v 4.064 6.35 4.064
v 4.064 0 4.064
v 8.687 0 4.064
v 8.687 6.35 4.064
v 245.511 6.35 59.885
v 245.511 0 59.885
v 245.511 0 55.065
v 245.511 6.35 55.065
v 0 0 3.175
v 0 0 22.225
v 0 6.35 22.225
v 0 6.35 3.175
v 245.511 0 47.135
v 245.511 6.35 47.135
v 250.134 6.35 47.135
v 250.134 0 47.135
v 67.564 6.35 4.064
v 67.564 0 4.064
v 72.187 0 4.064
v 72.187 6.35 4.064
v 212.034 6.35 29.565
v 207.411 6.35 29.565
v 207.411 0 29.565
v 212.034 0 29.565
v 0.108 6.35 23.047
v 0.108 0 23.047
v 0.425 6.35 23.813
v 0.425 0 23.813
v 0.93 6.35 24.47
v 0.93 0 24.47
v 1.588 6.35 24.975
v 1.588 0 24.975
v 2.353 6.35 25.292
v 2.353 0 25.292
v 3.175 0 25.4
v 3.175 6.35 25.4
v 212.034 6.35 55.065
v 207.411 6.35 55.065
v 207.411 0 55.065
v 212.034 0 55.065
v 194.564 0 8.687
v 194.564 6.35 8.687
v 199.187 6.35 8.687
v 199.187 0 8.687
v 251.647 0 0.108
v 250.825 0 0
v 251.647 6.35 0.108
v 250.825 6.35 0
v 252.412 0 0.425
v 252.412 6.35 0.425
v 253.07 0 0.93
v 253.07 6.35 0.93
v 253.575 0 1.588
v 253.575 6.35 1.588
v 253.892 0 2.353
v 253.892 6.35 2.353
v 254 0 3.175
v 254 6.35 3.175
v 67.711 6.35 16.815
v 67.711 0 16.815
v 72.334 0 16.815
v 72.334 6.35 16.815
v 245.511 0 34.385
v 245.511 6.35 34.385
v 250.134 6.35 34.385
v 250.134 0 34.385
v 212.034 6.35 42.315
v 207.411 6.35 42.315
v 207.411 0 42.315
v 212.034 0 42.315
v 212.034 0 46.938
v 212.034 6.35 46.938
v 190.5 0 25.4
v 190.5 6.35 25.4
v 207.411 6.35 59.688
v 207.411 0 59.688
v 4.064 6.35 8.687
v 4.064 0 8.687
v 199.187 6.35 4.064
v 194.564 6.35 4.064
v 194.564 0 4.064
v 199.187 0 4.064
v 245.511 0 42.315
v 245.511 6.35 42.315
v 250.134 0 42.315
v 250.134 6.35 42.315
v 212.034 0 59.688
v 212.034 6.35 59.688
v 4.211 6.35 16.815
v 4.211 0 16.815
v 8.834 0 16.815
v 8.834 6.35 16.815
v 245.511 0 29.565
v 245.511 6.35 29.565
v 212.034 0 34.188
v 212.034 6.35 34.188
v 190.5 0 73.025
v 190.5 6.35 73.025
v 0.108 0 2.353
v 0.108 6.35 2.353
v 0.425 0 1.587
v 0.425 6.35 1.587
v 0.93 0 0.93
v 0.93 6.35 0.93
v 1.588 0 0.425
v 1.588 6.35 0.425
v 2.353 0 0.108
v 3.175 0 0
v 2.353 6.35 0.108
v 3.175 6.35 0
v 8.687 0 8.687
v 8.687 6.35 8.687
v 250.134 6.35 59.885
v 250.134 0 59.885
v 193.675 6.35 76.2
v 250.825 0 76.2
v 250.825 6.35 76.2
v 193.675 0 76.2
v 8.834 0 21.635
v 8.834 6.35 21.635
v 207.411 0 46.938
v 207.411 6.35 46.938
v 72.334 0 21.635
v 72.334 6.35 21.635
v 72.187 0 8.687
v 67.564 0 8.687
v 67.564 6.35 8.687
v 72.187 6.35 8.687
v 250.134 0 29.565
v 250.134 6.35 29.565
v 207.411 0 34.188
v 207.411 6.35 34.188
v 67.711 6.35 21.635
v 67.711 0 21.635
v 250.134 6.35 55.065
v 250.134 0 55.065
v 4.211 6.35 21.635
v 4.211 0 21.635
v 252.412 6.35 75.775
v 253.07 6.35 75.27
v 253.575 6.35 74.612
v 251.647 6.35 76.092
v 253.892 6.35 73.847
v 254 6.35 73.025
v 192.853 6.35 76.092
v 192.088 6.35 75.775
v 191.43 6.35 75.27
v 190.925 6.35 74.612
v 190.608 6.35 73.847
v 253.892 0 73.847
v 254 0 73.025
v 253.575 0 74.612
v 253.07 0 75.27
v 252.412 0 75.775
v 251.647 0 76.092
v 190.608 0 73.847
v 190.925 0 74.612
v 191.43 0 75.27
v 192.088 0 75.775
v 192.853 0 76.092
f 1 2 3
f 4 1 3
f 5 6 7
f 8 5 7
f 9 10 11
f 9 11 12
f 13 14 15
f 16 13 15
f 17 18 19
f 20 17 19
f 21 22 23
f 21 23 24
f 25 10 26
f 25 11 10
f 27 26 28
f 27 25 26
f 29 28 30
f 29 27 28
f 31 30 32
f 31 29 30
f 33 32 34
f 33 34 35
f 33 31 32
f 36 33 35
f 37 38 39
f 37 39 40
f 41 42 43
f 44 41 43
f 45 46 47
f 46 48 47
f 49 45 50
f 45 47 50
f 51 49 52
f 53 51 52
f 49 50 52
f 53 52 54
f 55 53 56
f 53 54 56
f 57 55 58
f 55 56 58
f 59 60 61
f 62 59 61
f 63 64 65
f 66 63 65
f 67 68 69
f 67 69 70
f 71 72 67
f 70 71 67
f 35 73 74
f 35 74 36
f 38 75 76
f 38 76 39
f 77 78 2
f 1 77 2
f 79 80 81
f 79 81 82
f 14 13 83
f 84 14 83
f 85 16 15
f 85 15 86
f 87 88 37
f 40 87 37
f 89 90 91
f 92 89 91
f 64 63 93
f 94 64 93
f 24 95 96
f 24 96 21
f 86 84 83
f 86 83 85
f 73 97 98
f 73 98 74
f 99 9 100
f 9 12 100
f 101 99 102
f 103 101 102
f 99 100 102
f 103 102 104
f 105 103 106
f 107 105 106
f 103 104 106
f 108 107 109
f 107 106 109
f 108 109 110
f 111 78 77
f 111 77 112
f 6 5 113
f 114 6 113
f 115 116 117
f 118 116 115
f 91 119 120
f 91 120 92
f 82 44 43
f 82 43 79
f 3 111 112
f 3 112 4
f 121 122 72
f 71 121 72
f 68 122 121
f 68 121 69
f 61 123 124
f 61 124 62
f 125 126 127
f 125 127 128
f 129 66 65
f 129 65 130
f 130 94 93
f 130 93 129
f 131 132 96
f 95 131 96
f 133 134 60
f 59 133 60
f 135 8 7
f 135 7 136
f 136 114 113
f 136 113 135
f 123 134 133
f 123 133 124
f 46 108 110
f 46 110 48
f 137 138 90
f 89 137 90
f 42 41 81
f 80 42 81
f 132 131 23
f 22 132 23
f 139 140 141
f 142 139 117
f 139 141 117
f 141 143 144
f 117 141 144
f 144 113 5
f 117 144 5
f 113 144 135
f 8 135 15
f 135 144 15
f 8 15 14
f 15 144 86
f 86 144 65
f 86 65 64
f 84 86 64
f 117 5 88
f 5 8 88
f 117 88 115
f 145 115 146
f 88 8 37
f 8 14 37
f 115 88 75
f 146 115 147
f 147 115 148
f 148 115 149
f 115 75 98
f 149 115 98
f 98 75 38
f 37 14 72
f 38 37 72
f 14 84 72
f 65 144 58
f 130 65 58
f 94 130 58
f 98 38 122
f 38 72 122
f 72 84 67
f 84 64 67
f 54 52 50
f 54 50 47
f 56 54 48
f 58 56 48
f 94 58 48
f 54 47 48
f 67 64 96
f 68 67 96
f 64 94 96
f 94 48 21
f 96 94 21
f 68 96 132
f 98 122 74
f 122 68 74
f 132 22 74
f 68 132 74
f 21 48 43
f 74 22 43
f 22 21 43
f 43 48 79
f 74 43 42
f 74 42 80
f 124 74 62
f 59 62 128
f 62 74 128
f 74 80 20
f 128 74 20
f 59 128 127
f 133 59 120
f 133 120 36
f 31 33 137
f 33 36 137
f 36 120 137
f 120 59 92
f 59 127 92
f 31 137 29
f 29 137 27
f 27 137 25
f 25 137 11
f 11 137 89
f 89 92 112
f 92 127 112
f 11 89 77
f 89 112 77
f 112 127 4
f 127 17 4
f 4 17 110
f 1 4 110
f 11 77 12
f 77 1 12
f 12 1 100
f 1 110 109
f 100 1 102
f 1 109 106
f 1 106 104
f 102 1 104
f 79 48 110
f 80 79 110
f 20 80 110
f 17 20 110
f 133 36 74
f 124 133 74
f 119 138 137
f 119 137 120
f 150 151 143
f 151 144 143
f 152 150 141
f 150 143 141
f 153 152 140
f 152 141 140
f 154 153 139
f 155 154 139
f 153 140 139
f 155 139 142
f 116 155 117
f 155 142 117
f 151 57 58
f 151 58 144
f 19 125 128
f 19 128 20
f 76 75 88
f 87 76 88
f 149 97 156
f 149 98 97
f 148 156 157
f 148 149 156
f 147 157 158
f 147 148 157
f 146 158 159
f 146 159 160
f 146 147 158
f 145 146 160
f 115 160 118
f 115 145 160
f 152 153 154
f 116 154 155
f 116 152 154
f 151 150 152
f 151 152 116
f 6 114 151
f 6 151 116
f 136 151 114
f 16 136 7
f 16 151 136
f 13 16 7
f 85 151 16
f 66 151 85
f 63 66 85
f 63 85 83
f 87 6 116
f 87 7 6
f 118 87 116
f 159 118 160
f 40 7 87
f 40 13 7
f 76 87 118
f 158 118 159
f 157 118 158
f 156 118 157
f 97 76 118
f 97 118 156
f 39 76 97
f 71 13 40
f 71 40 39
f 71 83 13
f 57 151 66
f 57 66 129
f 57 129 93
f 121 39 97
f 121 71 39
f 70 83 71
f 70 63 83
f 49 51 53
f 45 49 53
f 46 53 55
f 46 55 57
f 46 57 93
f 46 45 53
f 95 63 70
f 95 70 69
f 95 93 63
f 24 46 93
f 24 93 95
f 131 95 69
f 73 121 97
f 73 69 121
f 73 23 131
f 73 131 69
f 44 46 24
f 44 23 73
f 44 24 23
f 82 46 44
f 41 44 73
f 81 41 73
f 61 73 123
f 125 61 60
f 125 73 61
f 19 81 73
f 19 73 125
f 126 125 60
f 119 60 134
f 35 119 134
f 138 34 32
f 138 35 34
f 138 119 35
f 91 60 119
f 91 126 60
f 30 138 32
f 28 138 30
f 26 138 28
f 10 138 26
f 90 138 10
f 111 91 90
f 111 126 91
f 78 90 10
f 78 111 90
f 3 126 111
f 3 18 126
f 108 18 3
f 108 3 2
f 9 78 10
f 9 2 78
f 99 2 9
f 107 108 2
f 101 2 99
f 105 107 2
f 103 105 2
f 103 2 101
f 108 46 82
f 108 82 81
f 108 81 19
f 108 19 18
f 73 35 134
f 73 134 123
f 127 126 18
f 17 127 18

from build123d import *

# Parameters (mm, degrees)
SKETCH1_W           = 4.6228
SKETCH1_H           = 4.819787269
SKETCH1_H_2         = 4.6228
BOSS_EXTRUDE1_DEPTH = 6.35
FILLET2_R           = 3.175
FILLET3_R           = 3.175


with BuildPart() as part:
    # Sketch1 → Boss-Extrude1 (new body)
    with BuildSketch(Plane(origin=(0, 0, 0), x_dir=(1, 0, 0), z_dir=(0, 1, 0))):
        Polygon((0, 0), (254, 0), (254, -76.2), (190.5, -76.2), (190.5, -25.4), (0, -25.4), align=None)
        with Locations((6.522414475, -19.224693634)):
            Rectangle(SKETCH1_W, SKETCH1_H, mode=Mode.SUBTRACT)
        with Locations((6.3754, -6.3754)):
            Rectangle(SKETCH1_W, SKETCH1_H_2, mode=Mode.SUBTRACT)
        with Locations((69.8754, -6.3754)):
            Rectangle(SKETCH1_W, SKETCH1_H_2, mode=Mode.SUBTRACT)
        with Locations((70.022414475, -19.224693634)):
            Rectangle(SKETCH1_W, SKETCH1_H, mode=Mode.SUBTRACT)
        with Locations((196.8754, -6.3754)):
            Rectangle(SKETCH1_W, SKETCH1_H_2, mode=Mode.SUBTRACT)
        with Locations((247.822414475, -31.974693634)):
            Rectangle(SKETCH1_W, SKETCH1_H, mode=Mode.SUBTRACT)
        with Locations((247.822414475, -44.724693634)):
            Rectangle(SKETCH1_W, SKETCH1_H, mode=Mode.SUBTRACT)
        with Locations((247.822414475, -57.474693634)):
            Rectangle(SKETCH1_W, SKETCH1_H, mode=Mode.SUBTRACT)
        with Locations((209.722414475, -31.8762)):
            Rectangle(SKETCH1_W, SKETCH1_H_2, mode=Mode.SUBTRACT)
        with Locations((209.722414475, -44.6262)):
            Rectangle(SKETCH1_W, SKETCH1_H_2, mode=Mode.SUBTRACT)
        with Locations((209.722414475, -57.3762)):
            Rectangle(SKETCH1_W, SKETCH1_H_2, mode=Mode.SUBTRACT)
    extrude(amount=BOSS_EXTRUDE1_DEPTH)

    # Fillet2
    fillet2_edges = [part.edges().sort_by_distance(p)[0] for p in [
        (0, 3.175, 25.4),
    ]]
    fillet(fillet2_edges, radius=FILLET2_R)

    # Fillet3
    fillet3_edges = [part.edges().sort_by_distance(p)[0] for p in [
        (0, 3.175, 0),
        (254, 3.175, 0),
        (254, 3.175, 76.2),
        (190.5, 3.175, 76.2),
    ]]
    fillet(fillet3_edges, radius=FILLET3_R)


solid = part.part
